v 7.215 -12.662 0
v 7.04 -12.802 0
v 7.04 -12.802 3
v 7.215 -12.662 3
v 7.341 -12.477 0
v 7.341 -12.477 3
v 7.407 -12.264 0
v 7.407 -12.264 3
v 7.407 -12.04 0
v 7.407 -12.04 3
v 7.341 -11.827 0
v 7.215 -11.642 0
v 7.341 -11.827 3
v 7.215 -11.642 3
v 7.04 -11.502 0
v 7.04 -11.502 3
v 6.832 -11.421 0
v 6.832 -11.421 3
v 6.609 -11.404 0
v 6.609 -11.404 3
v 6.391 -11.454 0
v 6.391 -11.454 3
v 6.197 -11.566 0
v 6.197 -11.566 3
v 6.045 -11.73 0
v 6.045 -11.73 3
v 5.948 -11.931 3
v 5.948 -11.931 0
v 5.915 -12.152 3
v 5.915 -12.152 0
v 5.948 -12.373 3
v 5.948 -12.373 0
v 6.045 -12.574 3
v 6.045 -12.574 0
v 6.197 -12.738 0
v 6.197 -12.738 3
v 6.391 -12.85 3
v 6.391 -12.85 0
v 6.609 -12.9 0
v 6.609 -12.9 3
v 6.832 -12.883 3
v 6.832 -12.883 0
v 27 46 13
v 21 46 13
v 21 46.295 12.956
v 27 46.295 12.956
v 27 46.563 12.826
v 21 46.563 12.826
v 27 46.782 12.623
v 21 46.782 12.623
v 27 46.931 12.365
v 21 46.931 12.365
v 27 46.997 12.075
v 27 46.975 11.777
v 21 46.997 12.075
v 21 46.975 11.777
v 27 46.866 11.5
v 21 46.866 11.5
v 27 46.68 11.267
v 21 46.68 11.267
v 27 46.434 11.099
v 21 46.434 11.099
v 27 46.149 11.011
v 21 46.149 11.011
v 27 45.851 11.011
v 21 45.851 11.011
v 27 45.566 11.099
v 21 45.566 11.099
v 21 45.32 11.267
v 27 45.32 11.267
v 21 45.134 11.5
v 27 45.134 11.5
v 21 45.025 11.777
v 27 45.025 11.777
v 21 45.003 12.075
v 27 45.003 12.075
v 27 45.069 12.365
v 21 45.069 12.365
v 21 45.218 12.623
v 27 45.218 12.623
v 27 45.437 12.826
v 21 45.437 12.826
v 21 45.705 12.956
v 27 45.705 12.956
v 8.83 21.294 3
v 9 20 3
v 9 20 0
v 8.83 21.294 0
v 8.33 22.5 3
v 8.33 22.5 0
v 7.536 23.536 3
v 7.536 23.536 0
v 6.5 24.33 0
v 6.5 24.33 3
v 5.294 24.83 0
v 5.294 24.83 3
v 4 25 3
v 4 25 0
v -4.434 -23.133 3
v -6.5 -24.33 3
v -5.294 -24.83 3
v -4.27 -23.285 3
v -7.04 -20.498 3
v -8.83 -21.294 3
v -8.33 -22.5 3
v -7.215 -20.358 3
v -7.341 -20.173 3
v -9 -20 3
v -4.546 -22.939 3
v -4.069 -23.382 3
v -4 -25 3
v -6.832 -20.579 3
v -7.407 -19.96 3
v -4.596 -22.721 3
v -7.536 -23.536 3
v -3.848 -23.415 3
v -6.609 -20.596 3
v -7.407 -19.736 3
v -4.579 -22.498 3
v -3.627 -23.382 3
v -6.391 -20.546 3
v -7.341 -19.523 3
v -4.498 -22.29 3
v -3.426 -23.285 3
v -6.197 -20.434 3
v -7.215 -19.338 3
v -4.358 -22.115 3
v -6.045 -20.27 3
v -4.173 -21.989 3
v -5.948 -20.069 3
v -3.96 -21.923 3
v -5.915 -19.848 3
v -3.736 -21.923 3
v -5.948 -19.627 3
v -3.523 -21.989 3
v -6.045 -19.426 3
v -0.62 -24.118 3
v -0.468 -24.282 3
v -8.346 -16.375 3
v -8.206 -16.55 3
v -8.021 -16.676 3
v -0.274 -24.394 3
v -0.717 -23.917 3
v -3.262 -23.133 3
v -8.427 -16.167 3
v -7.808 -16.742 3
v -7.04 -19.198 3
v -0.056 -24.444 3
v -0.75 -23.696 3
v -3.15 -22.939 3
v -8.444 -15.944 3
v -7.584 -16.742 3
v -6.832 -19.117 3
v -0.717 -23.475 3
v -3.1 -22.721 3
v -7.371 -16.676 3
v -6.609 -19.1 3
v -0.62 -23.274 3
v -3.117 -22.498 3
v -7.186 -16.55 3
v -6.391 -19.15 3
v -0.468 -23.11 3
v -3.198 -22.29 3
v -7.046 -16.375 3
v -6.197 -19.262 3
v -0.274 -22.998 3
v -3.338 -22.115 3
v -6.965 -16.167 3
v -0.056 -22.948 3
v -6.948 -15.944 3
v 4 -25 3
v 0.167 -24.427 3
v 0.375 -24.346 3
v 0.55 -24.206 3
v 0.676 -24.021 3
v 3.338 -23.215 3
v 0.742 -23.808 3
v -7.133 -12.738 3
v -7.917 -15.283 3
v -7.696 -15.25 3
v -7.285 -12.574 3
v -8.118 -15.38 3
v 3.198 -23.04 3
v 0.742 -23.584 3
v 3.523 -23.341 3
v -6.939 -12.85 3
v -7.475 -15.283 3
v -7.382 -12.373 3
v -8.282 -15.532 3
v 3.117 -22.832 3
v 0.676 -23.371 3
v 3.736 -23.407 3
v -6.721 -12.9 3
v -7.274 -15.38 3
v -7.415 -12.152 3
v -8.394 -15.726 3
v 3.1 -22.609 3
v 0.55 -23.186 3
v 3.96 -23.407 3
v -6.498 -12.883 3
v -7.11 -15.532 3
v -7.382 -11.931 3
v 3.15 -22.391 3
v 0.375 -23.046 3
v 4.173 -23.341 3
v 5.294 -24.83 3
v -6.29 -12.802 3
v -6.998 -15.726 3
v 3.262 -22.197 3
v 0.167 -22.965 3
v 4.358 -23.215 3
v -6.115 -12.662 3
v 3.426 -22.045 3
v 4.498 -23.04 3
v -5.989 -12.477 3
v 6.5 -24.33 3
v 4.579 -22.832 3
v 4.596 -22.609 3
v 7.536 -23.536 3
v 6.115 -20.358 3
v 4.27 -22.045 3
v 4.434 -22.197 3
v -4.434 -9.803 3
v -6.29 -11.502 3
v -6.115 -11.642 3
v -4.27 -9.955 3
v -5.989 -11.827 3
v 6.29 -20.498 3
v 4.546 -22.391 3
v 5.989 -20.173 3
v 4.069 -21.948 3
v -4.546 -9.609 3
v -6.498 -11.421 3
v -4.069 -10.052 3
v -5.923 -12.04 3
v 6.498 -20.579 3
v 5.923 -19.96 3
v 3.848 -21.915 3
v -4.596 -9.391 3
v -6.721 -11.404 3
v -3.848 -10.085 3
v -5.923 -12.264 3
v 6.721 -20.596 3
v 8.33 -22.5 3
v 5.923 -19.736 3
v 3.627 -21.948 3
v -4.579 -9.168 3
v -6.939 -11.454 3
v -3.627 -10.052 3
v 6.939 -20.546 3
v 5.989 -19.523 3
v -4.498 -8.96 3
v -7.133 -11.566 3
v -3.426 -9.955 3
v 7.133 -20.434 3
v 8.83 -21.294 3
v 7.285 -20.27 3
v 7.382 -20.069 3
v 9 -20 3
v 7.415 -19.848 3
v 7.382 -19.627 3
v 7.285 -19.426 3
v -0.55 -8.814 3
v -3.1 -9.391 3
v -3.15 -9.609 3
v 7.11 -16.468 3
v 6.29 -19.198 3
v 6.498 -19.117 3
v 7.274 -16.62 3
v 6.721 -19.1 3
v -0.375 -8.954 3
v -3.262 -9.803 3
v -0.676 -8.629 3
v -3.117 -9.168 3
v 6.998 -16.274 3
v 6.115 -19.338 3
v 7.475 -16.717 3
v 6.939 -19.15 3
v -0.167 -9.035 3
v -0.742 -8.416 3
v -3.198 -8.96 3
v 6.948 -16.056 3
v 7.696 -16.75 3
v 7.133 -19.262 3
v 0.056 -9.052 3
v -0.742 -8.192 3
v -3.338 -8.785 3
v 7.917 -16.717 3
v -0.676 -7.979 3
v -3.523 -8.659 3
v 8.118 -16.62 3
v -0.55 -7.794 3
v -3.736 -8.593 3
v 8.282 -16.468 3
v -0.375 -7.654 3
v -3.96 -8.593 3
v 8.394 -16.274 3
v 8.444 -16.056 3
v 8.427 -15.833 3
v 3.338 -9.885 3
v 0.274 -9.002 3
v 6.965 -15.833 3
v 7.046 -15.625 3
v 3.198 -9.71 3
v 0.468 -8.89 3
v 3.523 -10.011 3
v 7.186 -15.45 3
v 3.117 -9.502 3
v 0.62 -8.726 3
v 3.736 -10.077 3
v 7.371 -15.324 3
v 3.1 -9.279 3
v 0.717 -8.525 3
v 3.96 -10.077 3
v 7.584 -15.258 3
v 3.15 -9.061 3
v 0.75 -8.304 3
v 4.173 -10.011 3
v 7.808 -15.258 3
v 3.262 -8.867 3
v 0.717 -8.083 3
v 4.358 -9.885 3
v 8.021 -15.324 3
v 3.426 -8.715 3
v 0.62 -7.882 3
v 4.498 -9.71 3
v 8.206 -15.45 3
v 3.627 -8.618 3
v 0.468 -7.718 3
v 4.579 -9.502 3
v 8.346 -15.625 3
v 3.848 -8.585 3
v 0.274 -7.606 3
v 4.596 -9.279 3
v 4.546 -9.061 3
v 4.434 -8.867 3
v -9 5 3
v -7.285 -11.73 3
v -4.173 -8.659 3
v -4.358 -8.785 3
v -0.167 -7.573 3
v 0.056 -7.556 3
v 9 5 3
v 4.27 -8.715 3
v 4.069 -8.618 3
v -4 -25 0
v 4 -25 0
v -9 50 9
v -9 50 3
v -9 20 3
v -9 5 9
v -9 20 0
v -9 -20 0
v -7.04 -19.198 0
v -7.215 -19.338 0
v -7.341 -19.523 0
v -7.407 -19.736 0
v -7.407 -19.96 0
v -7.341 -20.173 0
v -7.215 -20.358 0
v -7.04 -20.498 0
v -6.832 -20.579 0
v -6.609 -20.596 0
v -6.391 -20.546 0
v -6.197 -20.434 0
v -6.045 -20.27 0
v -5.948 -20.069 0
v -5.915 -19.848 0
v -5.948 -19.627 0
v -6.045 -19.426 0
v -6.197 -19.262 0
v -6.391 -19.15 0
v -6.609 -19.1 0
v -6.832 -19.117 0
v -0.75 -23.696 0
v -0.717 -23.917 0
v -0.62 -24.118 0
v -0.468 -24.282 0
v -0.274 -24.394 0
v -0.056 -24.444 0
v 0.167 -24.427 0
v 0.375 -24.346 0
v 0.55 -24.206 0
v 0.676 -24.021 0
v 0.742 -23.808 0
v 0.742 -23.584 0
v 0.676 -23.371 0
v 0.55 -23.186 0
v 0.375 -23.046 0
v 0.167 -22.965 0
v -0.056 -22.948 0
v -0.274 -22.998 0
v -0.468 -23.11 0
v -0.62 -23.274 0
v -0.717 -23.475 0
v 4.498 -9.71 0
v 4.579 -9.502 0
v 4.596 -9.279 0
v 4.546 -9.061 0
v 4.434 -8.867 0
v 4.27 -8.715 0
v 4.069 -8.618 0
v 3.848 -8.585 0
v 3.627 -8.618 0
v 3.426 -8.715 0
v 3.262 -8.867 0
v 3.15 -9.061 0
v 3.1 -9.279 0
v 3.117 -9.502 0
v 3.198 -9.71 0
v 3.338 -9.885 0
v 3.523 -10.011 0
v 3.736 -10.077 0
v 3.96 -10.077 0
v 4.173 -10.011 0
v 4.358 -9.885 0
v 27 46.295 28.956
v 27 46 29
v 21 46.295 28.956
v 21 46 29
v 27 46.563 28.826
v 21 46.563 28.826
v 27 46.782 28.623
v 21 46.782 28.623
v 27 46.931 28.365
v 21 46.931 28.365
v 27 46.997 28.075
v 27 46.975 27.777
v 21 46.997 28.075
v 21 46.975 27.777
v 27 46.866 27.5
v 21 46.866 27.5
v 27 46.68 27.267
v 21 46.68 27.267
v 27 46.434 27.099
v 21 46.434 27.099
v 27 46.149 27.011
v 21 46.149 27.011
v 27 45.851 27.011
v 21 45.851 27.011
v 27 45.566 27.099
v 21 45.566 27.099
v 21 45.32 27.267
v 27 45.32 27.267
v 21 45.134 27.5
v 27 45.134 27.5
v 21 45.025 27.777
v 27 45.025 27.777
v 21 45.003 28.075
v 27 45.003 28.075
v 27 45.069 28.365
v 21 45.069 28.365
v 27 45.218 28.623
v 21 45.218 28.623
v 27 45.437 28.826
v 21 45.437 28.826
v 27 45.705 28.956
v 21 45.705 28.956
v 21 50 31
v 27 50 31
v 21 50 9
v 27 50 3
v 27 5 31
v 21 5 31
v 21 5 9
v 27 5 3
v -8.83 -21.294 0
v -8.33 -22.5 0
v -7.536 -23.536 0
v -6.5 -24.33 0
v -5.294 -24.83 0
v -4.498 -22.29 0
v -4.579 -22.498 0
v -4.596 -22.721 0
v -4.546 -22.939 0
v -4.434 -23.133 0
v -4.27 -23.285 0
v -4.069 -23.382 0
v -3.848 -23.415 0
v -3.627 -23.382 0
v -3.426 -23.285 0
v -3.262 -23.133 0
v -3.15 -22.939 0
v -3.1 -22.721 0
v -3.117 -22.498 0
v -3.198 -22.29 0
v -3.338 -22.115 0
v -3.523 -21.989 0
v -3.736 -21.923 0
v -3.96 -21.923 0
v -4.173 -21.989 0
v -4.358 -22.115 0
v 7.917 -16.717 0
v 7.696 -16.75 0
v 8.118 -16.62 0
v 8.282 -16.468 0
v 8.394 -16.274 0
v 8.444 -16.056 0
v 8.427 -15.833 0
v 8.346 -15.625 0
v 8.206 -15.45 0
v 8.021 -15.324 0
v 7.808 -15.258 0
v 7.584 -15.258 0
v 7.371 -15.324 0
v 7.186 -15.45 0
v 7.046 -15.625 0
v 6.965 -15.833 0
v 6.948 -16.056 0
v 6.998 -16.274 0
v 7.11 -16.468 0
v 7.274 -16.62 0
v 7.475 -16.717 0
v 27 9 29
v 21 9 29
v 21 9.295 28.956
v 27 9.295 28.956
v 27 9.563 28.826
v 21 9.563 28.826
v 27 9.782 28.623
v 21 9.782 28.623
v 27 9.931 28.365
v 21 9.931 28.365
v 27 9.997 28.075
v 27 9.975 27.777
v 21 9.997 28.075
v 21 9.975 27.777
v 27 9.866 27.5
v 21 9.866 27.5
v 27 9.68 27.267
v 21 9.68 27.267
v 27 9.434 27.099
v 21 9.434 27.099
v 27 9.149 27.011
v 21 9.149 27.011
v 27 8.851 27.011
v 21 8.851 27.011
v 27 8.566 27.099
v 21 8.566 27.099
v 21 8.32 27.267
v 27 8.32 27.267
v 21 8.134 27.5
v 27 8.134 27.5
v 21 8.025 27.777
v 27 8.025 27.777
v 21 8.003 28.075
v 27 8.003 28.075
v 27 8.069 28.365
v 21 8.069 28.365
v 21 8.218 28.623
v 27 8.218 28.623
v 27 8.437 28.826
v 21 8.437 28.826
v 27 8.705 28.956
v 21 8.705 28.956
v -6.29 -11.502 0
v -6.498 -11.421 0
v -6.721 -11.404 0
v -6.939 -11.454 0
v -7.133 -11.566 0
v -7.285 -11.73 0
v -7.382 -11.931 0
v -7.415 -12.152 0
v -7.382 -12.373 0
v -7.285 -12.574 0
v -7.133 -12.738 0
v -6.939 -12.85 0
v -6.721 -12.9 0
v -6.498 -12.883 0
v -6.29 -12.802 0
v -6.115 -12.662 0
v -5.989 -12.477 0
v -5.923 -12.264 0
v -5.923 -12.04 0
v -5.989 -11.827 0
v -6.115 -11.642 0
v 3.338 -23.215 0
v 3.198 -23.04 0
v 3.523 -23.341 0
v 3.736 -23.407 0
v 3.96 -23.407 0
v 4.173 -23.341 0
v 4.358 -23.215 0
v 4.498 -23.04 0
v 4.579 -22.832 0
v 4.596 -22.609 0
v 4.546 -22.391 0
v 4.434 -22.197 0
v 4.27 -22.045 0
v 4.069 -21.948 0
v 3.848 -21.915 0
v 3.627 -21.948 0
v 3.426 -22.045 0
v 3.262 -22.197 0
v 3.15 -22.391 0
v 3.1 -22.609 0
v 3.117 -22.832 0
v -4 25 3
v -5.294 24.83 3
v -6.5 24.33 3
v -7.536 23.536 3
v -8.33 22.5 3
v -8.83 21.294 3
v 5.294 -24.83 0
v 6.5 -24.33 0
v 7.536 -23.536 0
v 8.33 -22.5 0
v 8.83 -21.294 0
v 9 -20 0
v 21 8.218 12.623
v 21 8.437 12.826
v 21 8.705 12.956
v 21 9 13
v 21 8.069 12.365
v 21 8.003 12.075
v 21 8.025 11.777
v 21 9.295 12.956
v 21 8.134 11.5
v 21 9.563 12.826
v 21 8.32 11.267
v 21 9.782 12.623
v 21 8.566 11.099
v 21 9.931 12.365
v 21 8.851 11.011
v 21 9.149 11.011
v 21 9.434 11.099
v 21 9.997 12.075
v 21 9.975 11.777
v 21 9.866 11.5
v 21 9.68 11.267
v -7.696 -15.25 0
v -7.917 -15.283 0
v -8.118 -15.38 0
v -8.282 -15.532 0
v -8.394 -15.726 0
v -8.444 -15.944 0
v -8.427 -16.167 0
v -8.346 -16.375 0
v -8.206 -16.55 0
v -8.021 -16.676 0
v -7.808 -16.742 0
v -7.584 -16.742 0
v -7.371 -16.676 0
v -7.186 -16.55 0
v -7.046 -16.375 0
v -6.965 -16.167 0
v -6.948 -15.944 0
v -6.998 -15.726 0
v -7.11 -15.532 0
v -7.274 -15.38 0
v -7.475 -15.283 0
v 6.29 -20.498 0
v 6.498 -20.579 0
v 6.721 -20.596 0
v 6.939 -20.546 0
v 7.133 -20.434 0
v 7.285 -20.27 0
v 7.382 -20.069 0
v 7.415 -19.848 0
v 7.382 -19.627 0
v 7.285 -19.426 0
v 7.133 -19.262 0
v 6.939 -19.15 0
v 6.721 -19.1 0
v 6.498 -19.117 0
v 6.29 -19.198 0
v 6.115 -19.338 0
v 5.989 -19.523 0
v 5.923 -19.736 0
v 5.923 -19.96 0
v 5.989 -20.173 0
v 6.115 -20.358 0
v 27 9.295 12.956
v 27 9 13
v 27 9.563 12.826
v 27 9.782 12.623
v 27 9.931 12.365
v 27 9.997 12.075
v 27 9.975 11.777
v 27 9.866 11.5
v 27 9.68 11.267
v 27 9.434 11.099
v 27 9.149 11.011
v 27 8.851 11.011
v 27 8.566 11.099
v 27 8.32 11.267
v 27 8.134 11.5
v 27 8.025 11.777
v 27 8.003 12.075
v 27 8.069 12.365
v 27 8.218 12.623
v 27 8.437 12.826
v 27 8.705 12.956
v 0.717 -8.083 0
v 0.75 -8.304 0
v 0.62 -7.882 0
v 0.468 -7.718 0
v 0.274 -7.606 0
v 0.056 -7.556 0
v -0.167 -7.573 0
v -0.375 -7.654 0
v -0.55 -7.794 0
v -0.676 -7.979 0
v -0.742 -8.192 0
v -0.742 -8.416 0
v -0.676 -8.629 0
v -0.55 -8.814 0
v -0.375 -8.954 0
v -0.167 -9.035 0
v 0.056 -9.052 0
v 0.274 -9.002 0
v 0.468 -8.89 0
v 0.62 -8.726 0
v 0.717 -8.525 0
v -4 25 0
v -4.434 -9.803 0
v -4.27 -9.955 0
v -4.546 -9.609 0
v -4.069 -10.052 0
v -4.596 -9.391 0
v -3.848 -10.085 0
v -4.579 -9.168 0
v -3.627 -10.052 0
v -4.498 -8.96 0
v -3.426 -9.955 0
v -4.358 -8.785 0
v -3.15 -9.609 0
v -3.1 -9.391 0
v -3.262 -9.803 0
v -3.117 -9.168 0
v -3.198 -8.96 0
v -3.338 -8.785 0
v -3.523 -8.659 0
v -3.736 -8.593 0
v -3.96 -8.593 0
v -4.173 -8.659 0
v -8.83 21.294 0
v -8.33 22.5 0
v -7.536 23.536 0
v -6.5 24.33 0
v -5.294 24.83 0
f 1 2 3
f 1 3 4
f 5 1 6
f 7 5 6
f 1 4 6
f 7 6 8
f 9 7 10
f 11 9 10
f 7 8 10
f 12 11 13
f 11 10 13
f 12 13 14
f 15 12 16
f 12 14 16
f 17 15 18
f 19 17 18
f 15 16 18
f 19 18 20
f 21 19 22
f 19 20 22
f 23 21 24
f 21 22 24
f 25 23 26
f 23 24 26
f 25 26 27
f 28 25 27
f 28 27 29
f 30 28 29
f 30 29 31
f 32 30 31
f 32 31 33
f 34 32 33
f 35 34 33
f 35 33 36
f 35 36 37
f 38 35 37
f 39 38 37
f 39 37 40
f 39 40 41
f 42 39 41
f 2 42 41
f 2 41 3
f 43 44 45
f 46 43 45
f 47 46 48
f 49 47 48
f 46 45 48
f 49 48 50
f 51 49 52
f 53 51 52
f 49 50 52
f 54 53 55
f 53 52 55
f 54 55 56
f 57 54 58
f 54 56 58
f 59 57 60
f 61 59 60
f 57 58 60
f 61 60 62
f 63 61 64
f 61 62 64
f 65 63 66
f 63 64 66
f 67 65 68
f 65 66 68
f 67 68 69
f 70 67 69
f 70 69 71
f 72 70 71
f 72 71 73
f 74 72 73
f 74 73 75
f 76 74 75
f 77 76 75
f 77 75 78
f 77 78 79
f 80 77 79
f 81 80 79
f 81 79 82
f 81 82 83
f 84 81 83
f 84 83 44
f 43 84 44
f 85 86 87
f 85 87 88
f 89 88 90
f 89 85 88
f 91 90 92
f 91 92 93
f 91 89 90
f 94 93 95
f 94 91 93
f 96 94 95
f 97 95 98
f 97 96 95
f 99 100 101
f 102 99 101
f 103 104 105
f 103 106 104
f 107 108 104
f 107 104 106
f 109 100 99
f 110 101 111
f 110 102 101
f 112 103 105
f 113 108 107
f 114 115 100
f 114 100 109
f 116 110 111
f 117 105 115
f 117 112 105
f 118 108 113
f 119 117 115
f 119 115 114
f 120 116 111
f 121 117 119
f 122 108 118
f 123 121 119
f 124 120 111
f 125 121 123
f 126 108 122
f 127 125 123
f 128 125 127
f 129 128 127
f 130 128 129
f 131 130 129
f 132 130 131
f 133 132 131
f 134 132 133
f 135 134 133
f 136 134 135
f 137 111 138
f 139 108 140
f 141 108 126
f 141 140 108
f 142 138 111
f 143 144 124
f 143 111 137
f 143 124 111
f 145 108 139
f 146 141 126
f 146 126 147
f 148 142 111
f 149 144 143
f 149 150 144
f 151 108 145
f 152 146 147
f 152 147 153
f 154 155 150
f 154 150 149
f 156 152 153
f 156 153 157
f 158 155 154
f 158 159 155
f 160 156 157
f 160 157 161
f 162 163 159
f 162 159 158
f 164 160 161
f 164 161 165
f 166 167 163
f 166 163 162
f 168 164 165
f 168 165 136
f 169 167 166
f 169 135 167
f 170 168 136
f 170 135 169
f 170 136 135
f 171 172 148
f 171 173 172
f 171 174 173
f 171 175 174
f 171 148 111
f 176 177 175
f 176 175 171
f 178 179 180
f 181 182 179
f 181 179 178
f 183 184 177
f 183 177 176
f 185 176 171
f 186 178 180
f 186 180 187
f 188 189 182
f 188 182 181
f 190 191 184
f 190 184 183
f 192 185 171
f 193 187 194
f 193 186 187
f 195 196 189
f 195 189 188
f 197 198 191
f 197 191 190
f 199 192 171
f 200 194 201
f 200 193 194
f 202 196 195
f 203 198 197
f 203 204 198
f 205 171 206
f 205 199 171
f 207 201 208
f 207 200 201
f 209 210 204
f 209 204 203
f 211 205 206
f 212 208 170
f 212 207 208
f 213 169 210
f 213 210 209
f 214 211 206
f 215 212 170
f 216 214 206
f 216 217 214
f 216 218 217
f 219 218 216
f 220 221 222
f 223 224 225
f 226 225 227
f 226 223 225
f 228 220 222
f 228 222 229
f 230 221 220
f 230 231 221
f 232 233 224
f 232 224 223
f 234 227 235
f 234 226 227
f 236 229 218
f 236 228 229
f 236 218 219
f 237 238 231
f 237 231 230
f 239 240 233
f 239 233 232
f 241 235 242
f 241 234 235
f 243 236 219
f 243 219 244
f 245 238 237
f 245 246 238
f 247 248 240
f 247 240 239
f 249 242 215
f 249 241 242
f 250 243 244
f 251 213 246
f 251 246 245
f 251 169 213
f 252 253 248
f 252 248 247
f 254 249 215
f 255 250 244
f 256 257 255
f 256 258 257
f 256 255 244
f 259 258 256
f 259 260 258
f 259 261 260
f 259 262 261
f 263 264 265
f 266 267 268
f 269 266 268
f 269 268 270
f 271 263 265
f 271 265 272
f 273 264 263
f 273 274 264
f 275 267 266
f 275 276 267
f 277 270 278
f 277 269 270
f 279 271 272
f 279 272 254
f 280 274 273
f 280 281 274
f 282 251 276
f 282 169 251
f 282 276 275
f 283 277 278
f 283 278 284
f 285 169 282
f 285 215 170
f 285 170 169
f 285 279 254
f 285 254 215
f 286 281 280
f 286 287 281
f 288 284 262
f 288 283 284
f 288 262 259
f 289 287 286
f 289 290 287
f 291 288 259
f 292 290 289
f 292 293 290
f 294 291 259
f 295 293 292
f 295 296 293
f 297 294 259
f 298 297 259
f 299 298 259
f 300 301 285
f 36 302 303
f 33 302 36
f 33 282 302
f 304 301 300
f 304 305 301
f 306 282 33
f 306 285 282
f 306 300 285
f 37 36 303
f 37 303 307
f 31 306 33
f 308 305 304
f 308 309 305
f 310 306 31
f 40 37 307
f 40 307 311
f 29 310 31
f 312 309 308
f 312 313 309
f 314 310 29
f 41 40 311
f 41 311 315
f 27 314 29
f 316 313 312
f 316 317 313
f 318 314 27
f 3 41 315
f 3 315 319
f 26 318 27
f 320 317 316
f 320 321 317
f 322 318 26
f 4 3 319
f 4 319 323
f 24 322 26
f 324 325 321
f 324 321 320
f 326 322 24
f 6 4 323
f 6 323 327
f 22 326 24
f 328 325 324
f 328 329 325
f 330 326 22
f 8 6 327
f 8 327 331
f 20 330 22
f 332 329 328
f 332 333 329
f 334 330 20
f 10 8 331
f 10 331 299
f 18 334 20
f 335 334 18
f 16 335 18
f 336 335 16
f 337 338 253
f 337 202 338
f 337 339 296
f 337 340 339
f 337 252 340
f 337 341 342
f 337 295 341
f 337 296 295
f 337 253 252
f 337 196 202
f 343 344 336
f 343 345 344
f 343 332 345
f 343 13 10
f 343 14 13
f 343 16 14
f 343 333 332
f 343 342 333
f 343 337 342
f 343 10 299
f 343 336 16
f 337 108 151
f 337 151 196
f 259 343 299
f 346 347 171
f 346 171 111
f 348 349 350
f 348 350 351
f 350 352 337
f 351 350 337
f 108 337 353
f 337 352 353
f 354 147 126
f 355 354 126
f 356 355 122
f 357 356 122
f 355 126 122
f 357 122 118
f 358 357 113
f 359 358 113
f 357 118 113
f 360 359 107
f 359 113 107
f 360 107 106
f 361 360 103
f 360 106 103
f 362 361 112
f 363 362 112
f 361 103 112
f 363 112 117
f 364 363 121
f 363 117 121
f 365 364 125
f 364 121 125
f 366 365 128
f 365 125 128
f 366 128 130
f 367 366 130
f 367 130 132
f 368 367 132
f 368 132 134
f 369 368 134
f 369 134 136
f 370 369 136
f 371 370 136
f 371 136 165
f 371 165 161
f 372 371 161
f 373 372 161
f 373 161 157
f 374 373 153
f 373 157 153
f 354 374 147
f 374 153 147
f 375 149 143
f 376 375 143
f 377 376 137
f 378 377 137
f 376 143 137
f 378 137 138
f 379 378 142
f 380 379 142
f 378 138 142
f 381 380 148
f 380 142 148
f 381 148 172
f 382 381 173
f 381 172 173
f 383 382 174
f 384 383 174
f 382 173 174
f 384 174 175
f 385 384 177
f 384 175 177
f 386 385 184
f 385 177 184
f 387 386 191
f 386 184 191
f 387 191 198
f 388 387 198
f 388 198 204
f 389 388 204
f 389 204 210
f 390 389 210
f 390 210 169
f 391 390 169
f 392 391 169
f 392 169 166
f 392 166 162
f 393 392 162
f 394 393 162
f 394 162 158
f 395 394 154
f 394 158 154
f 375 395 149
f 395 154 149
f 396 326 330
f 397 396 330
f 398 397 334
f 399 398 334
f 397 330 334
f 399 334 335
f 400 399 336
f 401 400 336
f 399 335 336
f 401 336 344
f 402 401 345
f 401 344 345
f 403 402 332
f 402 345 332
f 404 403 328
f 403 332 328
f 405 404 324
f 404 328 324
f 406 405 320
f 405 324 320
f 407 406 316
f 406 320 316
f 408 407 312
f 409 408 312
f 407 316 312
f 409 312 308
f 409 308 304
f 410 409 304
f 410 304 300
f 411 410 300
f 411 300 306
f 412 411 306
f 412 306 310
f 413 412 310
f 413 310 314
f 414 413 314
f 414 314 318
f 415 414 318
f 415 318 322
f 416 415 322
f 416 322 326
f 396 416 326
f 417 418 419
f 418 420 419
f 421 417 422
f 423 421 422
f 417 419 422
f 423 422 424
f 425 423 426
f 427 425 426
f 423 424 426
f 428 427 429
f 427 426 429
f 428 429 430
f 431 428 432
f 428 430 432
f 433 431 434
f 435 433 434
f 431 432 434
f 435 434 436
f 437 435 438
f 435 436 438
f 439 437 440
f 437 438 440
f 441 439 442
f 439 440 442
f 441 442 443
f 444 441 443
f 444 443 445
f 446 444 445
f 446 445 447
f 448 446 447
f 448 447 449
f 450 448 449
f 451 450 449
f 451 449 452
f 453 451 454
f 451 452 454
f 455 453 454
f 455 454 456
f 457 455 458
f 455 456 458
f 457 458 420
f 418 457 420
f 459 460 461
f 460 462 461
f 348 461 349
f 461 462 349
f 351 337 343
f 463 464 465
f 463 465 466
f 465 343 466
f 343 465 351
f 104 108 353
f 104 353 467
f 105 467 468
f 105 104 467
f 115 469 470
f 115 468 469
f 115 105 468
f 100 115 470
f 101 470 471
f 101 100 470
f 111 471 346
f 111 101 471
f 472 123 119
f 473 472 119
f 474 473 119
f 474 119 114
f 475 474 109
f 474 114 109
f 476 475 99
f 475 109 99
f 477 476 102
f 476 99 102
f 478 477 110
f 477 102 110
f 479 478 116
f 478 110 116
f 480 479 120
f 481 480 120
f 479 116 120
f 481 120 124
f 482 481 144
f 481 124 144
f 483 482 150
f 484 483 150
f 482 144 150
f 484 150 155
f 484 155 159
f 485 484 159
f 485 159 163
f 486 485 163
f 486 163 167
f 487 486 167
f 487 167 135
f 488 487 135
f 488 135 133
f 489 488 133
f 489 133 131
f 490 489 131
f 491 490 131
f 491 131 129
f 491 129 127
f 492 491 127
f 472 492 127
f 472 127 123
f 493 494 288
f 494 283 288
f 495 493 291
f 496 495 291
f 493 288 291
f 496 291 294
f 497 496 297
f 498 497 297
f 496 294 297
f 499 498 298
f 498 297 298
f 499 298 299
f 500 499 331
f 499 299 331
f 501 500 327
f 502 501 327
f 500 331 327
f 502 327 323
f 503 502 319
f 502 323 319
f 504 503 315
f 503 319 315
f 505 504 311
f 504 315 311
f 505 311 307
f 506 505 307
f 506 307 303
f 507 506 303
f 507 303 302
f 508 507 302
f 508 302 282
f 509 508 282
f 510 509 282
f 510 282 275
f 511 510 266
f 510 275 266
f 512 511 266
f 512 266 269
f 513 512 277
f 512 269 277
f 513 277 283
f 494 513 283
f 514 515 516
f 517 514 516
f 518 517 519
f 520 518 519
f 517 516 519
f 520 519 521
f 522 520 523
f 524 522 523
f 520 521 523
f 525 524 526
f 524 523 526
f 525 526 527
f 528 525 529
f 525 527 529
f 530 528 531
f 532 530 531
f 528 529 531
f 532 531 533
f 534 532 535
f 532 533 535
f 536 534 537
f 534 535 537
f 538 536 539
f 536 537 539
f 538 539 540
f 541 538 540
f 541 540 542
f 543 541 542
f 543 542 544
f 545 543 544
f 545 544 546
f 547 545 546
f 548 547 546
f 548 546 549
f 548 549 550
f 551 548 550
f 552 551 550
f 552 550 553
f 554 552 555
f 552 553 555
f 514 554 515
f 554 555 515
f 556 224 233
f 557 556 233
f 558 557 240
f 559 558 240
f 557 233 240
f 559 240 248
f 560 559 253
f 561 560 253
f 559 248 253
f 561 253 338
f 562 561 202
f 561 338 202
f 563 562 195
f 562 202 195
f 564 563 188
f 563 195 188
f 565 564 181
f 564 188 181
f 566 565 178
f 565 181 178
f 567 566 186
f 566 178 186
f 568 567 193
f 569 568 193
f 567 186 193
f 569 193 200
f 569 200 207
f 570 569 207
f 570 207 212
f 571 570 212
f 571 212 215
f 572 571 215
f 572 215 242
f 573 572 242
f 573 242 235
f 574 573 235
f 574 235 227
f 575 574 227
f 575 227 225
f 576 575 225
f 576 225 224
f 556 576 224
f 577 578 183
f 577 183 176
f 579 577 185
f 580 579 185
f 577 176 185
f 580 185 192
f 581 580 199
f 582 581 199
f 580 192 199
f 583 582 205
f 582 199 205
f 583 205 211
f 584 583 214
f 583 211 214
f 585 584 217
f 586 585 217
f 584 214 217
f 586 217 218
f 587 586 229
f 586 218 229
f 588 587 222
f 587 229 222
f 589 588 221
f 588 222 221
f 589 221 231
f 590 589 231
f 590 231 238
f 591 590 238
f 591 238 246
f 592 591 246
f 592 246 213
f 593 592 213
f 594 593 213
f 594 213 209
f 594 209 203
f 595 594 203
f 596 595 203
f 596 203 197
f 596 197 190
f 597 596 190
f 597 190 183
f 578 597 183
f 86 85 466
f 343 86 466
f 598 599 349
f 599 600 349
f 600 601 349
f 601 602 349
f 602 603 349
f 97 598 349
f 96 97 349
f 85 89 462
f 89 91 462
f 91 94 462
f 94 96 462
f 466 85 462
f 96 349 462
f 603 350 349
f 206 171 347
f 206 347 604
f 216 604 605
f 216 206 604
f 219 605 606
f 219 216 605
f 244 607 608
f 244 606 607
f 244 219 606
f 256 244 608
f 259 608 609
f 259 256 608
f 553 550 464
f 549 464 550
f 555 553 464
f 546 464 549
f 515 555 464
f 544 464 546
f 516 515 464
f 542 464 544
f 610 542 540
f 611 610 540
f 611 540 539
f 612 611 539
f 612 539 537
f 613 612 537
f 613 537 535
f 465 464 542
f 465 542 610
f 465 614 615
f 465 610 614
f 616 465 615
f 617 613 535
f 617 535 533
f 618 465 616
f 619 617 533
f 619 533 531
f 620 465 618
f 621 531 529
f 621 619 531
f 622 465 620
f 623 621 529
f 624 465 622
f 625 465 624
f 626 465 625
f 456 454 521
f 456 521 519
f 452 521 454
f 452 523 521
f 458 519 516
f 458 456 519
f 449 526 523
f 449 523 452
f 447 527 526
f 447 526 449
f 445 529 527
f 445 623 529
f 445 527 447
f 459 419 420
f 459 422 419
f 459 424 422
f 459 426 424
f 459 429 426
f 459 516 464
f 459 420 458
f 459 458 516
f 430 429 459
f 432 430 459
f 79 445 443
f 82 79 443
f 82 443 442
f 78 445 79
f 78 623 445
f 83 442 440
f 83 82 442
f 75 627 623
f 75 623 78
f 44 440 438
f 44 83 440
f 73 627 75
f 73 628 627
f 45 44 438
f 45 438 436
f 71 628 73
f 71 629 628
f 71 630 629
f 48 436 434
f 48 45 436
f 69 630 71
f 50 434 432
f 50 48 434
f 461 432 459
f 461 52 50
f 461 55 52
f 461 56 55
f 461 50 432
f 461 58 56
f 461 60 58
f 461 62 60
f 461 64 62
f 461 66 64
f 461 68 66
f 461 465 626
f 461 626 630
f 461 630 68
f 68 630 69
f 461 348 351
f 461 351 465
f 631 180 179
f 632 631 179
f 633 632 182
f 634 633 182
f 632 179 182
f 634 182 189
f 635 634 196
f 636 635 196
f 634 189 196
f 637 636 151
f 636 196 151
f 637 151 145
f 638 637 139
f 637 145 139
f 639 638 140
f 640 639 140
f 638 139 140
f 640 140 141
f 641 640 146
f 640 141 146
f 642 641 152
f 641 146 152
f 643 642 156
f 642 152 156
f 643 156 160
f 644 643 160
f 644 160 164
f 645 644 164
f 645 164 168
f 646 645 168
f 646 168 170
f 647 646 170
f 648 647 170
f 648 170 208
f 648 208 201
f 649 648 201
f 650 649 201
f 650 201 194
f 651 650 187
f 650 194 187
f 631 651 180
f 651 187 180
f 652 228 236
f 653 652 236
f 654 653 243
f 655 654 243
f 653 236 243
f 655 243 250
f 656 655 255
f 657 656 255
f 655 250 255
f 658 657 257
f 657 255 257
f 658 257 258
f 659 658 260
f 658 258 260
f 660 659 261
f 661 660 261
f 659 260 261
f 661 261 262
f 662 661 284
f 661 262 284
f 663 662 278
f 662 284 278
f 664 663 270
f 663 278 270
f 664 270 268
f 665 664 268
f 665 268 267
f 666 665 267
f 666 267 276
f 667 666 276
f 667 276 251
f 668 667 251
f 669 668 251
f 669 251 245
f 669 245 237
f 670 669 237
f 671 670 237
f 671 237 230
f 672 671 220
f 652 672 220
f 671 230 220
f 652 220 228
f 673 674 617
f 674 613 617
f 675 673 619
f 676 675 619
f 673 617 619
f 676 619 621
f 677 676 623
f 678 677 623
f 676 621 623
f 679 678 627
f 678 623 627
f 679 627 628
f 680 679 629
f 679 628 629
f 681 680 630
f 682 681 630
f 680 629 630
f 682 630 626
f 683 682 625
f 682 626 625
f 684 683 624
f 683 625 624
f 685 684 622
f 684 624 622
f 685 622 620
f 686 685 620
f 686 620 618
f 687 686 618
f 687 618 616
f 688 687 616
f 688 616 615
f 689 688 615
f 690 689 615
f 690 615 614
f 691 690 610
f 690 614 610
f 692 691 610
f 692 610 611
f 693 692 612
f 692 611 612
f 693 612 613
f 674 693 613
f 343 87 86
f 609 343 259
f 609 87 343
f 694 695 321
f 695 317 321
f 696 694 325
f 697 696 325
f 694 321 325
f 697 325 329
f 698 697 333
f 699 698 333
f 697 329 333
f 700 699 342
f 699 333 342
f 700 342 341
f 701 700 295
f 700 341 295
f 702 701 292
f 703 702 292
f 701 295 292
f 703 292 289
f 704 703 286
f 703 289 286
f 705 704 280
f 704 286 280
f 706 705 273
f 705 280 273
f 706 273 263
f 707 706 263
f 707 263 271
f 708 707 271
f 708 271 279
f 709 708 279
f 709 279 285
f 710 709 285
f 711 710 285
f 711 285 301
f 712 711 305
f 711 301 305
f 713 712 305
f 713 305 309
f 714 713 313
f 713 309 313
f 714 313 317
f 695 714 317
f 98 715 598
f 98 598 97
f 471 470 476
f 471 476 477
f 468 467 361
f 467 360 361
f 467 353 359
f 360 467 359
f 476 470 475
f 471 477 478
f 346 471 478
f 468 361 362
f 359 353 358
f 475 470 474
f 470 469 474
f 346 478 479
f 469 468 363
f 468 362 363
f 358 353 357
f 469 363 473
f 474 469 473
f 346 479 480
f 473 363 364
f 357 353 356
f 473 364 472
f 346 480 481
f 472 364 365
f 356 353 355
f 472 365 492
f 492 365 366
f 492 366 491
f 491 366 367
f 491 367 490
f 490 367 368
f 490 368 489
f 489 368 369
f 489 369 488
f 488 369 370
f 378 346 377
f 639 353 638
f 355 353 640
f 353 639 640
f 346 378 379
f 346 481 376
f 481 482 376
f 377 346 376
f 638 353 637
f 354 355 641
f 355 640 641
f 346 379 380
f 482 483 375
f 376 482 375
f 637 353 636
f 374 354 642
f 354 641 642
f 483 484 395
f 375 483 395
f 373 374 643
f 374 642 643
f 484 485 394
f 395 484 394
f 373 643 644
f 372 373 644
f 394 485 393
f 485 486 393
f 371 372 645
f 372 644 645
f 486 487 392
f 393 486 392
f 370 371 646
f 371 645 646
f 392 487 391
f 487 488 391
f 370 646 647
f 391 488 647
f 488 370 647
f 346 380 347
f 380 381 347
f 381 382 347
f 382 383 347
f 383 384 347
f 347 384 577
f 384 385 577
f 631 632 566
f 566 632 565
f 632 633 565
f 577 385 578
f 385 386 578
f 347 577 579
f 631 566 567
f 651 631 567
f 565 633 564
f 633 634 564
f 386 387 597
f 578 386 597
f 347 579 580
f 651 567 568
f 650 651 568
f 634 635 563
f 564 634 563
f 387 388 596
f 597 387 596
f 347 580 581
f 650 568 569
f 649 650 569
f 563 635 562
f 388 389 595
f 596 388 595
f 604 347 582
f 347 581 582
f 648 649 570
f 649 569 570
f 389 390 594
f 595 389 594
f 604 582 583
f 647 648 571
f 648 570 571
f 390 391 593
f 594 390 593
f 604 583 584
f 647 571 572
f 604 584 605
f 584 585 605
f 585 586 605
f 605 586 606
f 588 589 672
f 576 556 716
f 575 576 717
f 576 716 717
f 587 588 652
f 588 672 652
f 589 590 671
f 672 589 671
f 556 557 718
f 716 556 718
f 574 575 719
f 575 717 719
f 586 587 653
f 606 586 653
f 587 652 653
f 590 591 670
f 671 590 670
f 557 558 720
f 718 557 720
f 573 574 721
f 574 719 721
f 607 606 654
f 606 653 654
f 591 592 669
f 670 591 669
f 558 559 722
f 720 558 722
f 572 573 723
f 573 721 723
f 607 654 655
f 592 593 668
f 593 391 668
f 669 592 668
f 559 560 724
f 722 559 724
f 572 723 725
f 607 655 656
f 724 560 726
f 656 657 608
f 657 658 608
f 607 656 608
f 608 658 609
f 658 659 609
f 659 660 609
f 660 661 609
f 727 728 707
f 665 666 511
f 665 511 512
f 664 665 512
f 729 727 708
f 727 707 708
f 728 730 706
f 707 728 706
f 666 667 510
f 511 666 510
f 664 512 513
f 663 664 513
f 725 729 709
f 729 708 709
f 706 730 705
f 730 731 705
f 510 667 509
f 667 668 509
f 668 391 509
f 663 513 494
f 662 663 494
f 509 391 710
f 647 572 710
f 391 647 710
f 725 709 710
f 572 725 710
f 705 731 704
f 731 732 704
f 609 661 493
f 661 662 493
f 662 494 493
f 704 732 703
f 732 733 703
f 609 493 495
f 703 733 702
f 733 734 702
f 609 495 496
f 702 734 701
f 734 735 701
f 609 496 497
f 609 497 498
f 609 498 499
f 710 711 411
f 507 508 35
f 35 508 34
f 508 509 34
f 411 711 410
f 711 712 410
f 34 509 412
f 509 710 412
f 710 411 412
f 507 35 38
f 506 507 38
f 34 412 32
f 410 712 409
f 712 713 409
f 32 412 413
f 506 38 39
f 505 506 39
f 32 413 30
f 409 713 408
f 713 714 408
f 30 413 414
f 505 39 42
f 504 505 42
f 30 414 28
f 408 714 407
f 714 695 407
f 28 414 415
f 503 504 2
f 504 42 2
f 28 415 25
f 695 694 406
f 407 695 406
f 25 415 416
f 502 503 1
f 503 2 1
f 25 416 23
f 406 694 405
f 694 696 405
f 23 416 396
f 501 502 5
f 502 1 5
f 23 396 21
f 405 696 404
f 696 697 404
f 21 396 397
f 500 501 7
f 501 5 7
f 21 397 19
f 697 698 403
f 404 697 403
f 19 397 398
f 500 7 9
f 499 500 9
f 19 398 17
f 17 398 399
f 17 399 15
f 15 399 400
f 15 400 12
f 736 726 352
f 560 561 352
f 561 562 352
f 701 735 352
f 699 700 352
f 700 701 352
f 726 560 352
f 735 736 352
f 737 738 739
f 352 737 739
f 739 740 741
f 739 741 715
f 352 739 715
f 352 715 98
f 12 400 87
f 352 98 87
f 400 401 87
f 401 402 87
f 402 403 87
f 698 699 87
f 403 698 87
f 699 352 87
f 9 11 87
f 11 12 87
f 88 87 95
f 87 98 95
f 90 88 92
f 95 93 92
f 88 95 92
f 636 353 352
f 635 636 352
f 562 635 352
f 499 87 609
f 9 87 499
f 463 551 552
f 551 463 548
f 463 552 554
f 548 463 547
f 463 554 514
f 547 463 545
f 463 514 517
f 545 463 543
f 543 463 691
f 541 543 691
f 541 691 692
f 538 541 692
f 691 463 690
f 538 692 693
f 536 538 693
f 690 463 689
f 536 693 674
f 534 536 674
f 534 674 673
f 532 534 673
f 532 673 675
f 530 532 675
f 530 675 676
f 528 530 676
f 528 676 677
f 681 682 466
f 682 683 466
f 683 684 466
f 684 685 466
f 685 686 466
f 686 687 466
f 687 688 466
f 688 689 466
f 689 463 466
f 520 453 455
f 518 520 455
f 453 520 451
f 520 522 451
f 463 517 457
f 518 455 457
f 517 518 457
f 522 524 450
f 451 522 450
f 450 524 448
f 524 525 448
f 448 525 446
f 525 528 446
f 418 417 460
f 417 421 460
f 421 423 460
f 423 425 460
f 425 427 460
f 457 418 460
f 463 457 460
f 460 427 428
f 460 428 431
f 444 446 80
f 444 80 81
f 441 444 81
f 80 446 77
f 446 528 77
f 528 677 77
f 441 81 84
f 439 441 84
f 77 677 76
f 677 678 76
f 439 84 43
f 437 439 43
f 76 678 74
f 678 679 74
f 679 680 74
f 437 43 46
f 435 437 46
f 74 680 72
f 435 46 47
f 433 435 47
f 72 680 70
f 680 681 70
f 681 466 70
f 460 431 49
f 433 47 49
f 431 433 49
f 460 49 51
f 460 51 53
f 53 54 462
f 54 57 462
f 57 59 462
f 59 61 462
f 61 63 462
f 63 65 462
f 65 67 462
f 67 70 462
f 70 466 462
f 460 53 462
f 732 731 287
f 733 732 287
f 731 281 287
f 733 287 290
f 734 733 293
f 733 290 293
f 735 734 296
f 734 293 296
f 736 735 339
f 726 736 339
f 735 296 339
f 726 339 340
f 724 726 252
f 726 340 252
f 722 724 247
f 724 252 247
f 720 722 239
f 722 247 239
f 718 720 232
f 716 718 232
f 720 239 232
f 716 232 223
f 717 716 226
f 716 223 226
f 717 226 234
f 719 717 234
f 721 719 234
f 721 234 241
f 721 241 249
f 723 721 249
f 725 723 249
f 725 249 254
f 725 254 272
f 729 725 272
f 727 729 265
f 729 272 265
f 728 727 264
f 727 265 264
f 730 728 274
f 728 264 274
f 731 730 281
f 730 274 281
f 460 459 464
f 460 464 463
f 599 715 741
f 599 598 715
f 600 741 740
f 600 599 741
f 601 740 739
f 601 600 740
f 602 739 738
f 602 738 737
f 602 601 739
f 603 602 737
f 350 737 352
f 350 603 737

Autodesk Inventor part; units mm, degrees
ref_plane "YZ Plane" through (0, 0, 0) normal (1, 0, 0) x (0, 1, 0)
ref_plane "XZ Plane" through (0, 0, 0) normal (0, 1, 0) x (-1, 0, 0)
ref_plane "XY Plane" through (0, 0, 0) normal (0, 0, 1) x (1, 0, 0)
sketch "Sketch1" plane through (0, 0, 0) normal (0, 0, 1) x (1, 0, 0)
  line L0 (-9, 25) -> (9, 25)
  line L1 (9, 25) -> (9, -25)
  line L2 (9, -25) -> (-9, -25)
  line L3 (-9, -25) -> (-9, 25)
  point P0 (0, 0)
  point P1 (0, 25)
  point P2 (-9, 0)
  dimension "d0" = 18
  dimension "d1" = 50
extrude "Extrusion1" add sketch "Sketch1" along normal blind 3
fillet "Fillet1" radius 5 2 edges at (-9, -25, 1.5) (9, -25, 1.5)
fillet "Fillet2" radius 5 2 edges at (-9, 25, 1.5) (9, 25, 1.5)
sketch "Sketch2" plane through (0, 0, 3) normal (0, 0, 1) x (1, 0, 0)
  circle A0 centre (0, -16) radius 9
  circle A1 centre (0, 16) radius 9
  line L0 (-4, -25) -> (4, -25) projected
  circle A2 centre (0, -8.304) radius 0.75
  line L1 (4, 25) -> (-4, 25) projected
  point P0 (0, 0)
  dimension "d6" = 18
  dimension "d8" = 1.5
  dimension "d10" = 18
extrude "Extrusion2" cut sketch "Sketch2" against normal up to surface (3 mm away) contours A2
pattern_circular "Circular Pattern1" count 12 over 360 about axis through (0, -16, 3) along (0, 0, 1) of "Extrusion2"
sketch "Sketch4" plane through (0, 0, 3) normal (0, 0, 1) x (1, 0, 0)
  line L0 (-9, 5) -> (27, 5)
  line L1 (27, 5) -> (27, 50)
  line L2 (27, 50) -> (-9, 50)
  line L3 (-9, 50) -> (-9, 5)
  line L4 (-9, 20) -> (-9, -20) projected
  line L5 (4, 25) -> (-4, 25) projected
  point P0 (0, 0)
  dimension "d25" = 36
  dimension "d26" = 45
  dimension "d27" = 20
extrude "Extrusion5" add sketch "Sketch4" along normal blind 6
sketch "Sketch5" plane through (0, 0, 3) normal (0, 0, 1) x (1, 0, 0)
  line L0 (27, 50) -> (-9, 50) projected
  line L1 (27, 5) -> (21, 5)
  line L2 (21, 5) -> (21, 50)
  line L3 (21, 50) -> (27, 50)
  line L4 (27, 50) -> (27, 5)
  point P0 (0, 0)
  dimension "d30" = 6
extrude "Extrusion6" add sketch "Sketch5" along normal blind 28
sketch "Sketch6" plane through (21, 5, 3) normal (-1, 0, 0) x (0, 0, 1)
  circle A0 centre (25, 4) radius 1
  circle A1 centre (9, 4) radius 1
  circle A2 centre (25, 41) radius 1
  circle A3 centre (9, 41) radius 1
  line L0 (6, 0) -> (28, 0) projected
  line L1 (25, 4) -> (25, 41) construction
  line L2 (28, 45) -> (28, 0) projected
  point P0 (-3, -5)
  point P1 (0, 0)
  point P2 (28, 22.5)
  point P3 (25, 22.5)
  dimension "d33" = 2
  dimension "d34" = 2
  dimension "d35" = 2
  dimension "d36" = 2
  dimension "d37" = 37
  dimension "d38" = 16
  dimension "d40" = 16
  dimension "d43" = 3
extrude "Extrusion7" cut sketch "Sketch6" against normal up to surface (6 mm away)
properties part number "first_perc_link"
